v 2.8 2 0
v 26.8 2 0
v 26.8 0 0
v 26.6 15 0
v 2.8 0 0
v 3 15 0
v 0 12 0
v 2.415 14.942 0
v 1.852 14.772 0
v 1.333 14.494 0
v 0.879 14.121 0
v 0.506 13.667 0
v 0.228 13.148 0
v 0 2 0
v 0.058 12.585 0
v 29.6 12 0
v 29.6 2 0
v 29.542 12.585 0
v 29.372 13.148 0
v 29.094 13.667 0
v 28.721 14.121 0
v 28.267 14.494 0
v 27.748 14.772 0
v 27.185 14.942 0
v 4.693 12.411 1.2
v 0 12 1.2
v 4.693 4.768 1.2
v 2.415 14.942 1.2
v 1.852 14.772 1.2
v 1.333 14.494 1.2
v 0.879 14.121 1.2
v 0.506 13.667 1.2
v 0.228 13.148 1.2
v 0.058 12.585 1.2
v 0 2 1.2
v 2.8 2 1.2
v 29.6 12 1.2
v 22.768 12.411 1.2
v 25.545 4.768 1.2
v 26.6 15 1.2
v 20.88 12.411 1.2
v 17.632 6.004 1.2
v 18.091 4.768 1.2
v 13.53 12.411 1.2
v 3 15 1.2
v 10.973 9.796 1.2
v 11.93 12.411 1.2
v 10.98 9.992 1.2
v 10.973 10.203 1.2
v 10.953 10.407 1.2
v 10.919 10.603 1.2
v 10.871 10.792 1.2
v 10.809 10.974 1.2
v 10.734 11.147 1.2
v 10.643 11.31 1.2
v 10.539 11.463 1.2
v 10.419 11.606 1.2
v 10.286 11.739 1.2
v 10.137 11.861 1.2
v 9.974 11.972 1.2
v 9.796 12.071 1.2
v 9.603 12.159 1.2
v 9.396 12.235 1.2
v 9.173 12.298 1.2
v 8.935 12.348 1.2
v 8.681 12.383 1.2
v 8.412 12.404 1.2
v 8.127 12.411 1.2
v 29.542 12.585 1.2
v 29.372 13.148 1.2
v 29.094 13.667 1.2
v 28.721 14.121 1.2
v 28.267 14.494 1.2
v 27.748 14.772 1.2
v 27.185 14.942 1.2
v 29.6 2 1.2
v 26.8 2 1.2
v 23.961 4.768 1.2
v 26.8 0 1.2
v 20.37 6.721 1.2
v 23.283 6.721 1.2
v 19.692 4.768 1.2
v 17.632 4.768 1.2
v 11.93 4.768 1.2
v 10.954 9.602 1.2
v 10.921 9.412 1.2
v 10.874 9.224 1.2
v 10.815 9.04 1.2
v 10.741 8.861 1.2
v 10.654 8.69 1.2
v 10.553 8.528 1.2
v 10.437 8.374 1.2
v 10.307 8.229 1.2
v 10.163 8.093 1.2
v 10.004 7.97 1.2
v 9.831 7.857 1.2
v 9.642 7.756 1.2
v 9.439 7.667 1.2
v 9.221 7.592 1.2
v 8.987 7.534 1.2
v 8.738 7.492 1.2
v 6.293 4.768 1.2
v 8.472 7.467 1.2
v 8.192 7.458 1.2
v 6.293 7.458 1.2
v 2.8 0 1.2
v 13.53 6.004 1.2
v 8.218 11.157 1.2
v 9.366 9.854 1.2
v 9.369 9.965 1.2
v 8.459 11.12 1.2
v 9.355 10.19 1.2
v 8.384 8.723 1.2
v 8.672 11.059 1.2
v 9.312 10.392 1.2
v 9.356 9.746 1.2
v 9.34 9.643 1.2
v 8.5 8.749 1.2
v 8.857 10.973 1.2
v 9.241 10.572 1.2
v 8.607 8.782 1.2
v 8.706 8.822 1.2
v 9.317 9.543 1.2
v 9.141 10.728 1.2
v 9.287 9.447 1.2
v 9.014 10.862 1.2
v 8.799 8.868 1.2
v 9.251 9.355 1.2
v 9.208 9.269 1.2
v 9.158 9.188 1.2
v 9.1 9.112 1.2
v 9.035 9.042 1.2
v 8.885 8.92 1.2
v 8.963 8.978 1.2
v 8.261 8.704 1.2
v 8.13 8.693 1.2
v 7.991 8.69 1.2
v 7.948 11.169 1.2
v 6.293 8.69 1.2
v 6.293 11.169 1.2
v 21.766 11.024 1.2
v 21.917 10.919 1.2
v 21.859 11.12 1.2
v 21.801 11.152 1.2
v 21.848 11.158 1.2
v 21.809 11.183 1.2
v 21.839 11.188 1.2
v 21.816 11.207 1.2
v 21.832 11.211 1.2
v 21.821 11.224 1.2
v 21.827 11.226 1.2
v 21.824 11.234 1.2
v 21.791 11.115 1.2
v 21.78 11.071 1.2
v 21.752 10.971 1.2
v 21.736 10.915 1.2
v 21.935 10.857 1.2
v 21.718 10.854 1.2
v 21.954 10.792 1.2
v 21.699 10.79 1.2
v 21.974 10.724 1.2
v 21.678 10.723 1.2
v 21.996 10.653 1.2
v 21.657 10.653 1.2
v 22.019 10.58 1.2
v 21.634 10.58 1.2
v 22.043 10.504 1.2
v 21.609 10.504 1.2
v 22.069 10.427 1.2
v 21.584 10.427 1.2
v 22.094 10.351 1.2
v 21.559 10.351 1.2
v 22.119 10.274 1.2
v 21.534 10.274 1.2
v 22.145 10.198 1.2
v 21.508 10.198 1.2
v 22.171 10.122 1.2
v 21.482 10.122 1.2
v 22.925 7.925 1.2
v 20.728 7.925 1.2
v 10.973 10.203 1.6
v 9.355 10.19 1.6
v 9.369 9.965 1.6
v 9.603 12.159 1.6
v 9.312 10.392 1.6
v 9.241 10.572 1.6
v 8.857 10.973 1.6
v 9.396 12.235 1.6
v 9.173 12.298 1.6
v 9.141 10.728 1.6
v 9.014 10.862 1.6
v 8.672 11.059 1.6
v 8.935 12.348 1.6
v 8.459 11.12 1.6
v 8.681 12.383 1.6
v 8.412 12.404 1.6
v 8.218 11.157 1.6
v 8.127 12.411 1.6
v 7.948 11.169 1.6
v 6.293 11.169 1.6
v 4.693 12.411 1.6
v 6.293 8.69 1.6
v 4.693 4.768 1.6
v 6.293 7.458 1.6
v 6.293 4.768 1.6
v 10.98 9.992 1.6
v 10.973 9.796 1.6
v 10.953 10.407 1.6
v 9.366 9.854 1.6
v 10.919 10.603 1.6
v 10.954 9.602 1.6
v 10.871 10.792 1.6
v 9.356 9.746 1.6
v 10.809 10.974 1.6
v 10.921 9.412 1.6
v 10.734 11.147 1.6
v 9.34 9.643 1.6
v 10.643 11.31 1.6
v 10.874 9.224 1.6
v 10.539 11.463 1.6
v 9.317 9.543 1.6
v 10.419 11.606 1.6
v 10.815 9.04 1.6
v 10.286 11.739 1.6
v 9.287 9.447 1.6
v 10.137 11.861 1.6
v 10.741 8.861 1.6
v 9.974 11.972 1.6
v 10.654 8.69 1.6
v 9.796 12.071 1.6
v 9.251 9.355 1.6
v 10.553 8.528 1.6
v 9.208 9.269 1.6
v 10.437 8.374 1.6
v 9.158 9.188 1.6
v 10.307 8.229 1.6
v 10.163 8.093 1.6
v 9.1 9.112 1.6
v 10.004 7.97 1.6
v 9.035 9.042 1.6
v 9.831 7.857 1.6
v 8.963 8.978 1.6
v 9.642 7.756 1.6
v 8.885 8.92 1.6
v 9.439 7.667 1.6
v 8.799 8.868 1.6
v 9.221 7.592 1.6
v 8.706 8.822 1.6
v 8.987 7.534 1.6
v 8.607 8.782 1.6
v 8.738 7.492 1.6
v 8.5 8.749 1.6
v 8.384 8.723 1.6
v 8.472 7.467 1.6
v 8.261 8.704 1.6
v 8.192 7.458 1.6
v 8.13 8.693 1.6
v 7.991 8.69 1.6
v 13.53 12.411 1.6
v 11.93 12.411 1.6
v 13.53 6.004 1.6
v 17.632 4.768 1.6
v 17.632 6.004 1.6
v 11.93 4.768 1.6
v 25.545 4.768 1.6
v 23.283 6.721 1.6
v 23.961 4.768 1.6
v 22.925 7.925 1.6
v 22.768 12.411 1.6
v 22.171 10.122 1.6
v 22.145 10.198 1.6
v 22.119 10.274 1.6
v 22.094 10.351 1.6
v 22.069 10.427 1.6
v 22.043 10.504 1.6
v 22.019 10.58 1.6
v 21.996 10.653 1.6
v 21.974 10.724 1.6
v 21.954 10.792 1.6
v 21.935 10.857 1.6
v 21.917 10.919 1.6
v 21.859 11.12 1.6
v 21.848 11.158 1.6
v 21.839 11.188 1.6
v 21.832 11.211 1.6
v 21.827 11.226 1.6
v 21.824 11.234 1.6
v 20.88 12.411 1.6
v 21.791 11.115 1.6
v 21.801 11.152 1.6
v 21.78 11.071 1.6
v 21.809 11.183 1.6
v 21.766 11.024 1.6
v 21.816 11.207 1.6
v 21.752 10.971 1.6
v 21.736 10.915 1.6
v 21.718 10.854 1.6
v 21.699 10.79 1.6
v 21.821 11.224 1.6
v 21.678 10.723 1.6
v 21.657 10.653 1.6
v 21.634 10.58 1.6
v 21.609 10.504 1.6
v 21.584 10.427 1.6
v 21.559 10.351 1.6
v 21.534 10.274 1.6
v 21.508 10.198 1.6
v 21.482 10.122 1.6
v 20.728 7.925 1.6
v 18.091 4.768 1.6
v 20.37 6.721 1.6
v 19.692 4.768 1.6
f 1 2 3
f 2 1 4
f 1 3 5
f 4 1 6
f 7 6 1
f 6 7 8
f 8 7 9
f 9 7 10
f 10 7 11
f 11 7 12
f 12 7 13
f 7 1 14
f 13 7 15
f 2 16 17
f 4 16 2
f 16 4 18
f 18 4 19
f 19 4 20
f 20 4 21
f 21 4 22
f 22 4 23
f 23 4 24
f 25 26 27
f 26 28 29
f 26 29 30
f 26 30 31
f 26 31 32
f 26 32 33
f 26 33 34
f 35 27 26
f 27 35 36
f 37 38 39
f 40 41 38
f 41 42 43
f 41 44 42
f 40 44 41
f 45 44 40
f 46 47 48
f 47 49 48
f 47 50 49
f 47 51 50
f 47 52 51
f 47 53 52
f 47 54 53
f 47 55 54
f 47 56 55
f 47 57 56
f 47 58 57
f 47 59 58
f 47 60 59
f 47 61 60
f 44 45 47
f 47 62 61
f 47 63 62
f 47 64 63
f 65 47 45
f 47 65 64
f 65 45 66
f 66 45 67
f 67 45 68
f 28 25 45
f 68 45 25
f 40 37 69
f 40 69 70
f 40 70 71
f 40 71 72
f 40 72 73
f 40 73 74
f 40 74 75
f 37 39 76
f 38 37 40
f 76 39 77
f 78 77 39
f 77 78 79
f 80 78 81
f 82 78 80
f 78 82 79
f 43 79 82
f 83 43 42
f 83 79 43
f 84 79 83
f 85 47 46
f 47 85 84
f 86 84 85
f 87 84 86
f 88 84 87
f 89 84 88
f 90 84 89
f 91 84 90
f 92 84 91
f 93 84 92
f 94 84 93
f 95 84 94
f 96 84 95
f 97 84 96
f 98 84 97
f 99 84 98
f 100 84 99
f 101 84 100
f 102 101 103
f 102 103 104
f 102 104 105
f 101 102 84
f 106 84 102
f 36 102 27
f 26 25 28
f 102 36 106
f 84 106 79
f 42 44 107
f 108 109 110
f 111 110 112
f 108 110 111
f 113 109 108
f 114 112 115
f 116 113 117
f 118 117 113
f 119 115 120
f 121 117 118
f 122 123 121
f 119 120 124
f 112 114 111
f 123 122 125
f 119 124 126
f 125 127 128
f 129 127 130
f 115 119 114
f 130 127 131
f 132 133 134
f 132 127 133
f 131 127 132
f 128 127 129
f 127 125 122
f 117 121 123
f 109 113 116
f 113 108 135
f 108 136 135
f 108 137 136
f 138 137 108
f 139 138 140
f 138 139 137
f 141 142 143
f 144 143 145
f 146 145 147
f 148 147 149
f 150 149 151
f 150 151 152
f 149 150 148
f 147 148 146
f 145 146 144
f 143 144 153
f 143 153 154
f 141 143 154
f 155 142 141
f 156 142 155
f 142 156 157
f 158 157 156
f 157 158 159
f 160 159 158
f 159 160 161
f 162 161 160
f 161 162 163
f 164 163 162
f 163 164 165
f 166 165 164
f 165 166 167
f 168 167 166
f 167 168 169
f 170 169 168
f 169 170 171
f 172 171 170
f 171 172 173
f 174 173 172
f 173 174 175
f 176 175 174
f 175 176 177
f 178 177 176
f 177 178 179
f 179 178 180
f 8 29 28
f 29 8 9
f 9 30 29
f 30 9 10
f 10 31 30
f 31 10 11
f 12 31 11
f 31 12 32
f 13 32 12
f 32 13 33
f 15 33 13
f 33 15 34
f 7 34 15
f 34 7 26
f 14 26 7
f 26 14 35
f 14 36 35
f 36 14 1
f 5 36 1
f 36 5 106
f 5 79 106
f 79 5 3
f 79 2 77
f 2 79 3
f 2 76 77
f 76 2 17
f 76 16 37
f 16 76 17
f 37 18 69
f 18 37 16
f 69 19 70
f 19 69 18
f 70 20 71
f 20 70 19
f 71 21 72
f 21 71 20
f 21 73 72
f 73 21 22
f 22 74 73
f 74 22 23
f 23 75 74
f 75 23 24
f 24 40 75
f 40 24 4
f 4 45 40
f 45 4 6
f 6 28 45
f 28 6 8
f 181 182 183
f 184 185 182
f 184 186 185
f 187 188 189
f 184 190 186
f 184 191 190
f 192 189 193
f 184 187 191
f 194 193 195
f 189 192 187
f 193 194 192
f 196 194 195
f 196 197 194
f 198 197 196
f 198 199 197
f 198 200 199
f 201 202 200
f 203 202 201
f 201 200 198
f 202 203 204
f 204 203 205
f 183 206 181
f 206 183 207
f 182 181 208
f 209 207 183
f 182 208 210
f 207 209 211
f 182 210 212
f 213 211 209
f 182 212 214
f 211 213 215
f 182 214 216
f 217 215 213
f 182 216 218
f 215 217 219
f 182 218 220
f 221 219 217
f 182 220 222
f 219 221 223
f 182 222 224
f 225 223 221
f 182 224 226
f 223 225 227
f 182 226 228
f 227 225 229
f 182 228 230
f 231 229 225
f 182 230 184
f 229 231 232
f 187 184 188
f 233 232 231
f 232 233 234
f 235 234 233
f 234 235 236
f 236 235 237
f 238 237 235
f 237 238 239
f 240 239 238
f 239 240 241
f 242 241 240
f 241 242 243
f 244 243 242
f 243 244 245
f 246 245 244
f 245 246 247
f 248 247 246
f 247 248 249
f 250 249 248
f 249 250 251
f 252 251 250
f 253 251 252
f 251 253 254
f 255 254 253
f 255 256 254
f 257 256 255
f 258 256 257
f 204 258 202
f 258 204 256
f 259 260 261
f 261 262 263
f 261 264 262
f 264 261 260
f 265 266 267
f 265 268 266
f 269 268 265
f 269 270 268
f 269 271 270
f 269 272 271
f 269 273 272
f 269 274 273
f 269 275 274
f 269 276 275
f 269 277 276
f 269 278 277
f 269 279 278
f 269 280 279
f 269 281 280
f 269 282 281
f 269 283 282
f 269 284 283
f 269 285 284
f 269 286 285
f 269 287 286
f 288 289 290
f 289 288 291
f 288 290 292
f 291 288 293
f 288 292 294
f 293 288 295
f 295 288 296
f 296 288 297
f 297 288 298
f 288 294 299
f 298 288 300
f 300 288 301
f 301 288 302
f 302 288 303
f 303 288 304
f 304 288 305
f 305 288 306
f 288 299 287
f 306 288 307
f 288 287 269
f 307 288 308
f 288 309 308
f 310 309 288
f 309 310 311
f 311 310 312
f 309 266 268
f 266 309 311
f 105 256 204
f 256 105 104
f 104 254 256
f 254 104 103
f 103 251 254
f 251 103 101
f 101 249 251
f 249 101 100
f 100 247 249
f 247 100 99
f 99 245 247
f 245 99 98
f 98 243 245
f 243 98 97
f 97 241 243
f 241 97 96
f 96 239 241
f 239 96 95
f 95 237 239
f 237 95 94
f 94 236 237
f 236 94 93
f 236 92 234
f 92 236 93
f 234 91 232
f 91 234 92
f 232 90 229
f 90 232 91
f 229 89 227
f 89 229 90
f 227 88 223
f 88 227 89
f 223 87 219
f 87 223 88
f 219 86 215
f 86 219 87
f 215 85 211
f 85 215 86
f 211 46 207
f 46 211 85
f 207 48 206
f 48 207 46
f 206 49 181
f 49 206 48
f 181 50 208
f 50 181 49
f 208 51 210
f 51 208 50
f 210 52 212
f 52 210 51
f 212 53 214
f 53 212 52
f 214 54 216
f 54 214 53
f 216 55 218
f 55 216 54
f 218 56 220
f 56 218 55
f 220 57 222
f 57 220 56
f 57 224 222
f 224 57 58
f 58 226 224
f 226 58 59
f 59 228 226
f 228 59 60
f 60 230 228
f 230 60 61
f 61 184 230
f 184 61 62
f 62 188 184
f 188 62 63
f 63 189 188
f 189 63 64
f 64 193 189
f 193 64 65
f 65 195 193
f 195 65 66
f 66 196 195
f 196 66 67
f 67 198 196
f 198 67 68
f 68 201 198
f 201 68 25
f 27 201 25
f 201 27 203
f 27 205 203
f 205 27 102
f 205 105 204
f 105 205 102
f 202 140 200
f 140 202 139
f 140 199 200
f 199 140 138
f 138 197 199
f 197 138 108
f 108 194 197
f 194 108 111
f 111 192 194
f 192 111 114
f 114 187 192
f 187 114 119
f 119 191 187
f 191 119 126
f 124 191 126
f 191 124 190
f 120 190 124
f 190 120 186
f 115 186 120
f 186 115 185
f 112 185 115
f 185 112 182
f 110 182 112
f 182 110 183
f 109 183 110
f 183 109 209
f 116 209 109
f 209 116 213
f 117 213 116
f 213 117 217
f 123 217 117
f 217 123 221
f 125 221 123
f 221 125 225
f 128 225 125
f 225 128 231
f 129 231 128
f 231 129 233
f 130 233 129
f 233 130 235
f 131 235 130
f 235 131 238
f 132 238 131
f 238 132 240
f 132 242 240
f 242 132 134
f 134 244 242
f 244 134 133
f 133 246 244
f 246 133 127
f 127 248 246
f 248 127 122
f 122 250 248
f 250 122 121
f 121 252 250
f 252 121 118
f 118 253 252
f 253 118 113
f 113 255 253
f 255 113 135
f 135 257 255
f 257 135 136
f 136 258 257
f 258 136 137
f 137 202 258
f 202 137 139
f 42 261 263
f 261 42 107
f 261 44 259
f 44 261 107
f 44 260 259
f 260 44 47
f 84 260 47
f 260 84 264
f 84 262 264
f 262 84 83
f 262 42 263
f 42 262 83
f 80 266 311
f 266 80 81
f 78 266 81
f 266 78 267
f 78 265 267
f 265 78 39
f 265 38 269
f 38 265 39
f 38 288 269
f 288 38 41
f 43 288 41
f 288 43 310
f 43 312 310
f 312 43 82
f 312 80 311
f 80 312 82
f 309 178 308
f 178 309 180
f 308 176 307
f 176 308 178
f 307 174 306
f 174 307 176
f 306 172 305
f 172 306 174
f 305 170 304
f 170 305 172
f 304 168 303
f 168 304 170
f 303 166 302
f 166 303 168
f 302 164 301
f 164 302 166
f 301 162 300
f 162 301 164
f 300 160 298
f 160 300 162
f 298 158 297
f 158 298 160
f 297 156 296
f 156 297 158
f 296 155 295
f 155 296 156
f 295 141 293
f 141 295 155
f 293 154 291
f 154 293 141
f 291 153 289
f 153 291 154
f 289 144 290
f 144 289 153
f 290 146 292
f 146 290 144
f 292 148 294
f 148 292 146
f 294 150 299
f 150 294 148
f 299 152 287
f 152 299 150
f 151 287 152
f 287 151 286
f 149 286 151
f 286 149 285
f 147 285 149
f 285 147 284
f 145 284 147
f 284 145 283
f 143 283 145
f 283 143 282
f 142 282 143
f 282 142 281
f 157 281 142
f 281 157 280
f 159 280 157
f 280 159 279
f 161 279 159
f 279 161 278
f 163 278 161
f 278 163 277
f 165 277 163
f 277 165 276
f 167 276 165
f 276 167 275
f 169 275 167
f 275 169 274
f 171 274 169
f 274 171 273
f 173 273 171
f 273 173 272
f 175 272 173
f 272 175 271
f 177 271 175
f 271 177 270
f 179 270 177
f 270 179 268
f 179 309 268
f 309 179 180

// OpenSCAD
/* [show] */
showStand=true;
showLabel=true;
showCut=true;
showSwatch=true;
variant="normal"; //["normal","narrow"]
/* [Dimensions] */
ovDims= variant=="narrow" ? [72,150,35] : [74,150,35];
lblDims=[29.6,1.2,15];
lblSpcng=0.1;
lblLidLen=2;
lblLidWdth=24;

lblVertPos=[ovDims.x/2,0.8,1.0];

/* [label] */
Text="PLA";
Text_Style="Emboss"; //["Emboss", "Engrave", "Inset"]
Text_Size=8;
Text_Depth=0.4;
Text_Color="#000000"; //color
Back_Color="#00EEFF"; //color
Font_Face="Liberation Sans"; // ["Aldo", "Anton", "Archivo Black", "Asap", "Bangers", "Black Han Sans", "Bubblegum Sans", "Bungee", "Changa One", "Chewy", "Concert One", "Fruktur", "Gochi Hand", "Griffy", "HarmonyOS Sans SC", "Inter", "Inter Tight", "Itim", "Jockey One", "Kanit", "Kavoon", "Komikazoom", "Lato", "Liberation Sans", "Lilita One", "Lobster", "Lora", "Luckiest Guy", "Merriweather", "Merriweather Sans", "Mitr", "Montserrat", "Montserrat Alternates", "Montserrat Subrayada", "Nanum Pen", "Norwester", "Noto Emoji", "Noto Sans", "Noto Sans Adlam", "Noto Sans Adlam Unjoined", "Noto Sans Anatolian Hieroglyphs", "Noto Sans Arabic", "Noto Sans Arabic UI", "Noto Sans Armenian", "Noto Sans Avestan", "Noto Sans Balinese", "Noto Sans Bamum", "Noto Sans Bassa Vah", "Noto Sans Batak", "Noto Sans Bengali", "Noto Sans Bengali UI", "Noto Sans Bhaiksuki", "Noto Sans Brahmi", "Noto Sans Buginese", "Noto Sans Buhid", "Noto Sans Canadian Aboriginal", "Noto Sans Carian", "Noto Sans Caucasian Albanian", "Noto Sans Chakma", "Noto Sans Cham", "Noto Sans Cherokee", "Noto Sans Chorasmian", "Noto Sans Coptic", "Noto Sans Cuneiform", "Noto Sans Cypriot", "Noto Sans Cypro Minoan", "Noto Sans Deseret", "Noto Sans Devanagari", "Noto Sans Devanagari UI", "Noto Sans Display", "Noto Sans Duployan", "Noto Sans Egyptian Hieroglyphs", "Noto Sans Elbasan", "Noto Sans Elymaic", "Noto Sans Ethiopic", "Noto Sans Georgian", "Noto Sans Glagolitic", "Noto Sans Gothic", "Noto Sans Grantha", "Noto Sans Gujarati", "Noto Sans Gujarati UI", "Noto Sans Gunjala Gondi", "Noto Sans Gurmukhi", "Noto Sans Gurmukhi UI", "Noto Sans HK", "Noto Sans Hanifi Rohingya", "Noto Sans Hanunoo", "Noto Sans Hatran", "Noto Sans Hebrew", "Noto Sans Imperial Aramaic", "Noto Sans Indic Siyaq Numbers", "Noto Sans Inscriptional Pahlavi", "Noto Sans Inscriptional Parthian", "Noto Sans JP", "Noto Sans Javanese", "Noto Sans KR", "Noto Sans Kaithi", "Noto Sans Kannada", "Noto Sans Kannada UI", "Noto Sans Kawi", "Noto Sans Kayah Li", "Noto Sans Kharoshthi", "Noto Sans Khmer", "Noto Sans Khmer UI", "Noto Sans Khojki", "Noto Sans Khudawadi", "Noto Sans Lao", "Noto Sans Lao Looped", "Noto Sans Lao UI", "Noto Sans Lepcha", "Noto Sans Limbu", "Noto Sans Linear A", "Noto Sans Linear B", "Noto Sans Lisu", "Noto Sans Lycian", "Noto Sans Lydian", "Noto Sans Mahajani", "Noto Sans Malayalam", "Noto Sans Malayalam UI", "Noto Sans Mandaic", "Noto Sans Manichaean", "Noto Sans Marchen", "Noto Sans Masaram Gondi", "Noto Sans Math", "Noto Sans Mayan Numerals", "Noto Sans Medefaidrin", "Noto Sans Meetei Mayek", "Noto Sans Mende Kikakui", "Noto Sans Meroitic", "Noto Sans Miao", "Noto Sans Modi", "Noto Sans Mongolian", "Noto Sans Mono", "Noto Sans Mro", "Noto Sans Multani", "Noto Sans Myanmar", "Noto Sans Myanmar UI", "Noto Sans NKo", "Noto Sans NKo Unjoined", "Noto Sans Nabataean", "Noto Sans Nag Mundari", "Noto Sans Nandinagari", "Noto Sans New Tai Lue", "Noto Sans Newa", "Noto Sans Nushu", "Noto Sans Ogham", "Noto Sans Ol Chiki", "Noto Sans Old Hungarian", "Noto Sans Old Italic", "Noto Sans Old North Arabian", "Noto Sans Old Permic", "Noto Sans Old Persian", "Noto Sans Old Sogdian", "Noto Sans Old South Arabian", "Noto Sans Old Turkic", "Noto Sans Oriya", "Noto Sans Oriya UI", "Noto Sans Osage", "Noto Sans Osmanya", "Noto Sans Pahawh Hmong", "Noto Sans Palmyrene", "Noto Sans Pau Cin Hau", "Noto Sans PhagsPa", "Noto Sans Phoenician", "Noto Sans Psalter Pahlavi", "Noto Sans Rejang", "Noto Sans Runic", "Noto Sans SC", "Noto Sans Samaritan", "Noto Sans Saurashtra", "Noto Sans Sharada", "Noto Sans Shavian", "Noto Sans Siddham", "Noto Sans SignWriting", "Noto Sans Sinhala", "Noto Sans Sinhala UI", "Noto Sans Sogdian", "Noto Sans Sora Sompeng", "Noto Sans Soyombo", "Noto Sans Sundanese", "Noto Sans Syloti Nagri", "Noto Sans Symbols", "Noto Sans Symbols 2", "Noto Sans Syriac", "Noto Sans Syriac Eastern", "Noto Sans TC", "Noto Sans Tagalog", "Noto Sans Tagbanwa", "Noto Sans Tai Le", "Noto Sans Tai Tham", "Noto Sans Tai Viet", "Noto Sans Takri", "Noto Sans Tamil", "Noto Sans Tamil Supplement", "Noto Sans Tamil UI", "Noto Sans Tangsa", "Noto Sans Telugu", "Noto Sans Telugu UI", "Noto Sans Thaana", "Noto Sans Thai", "Noto Sans Thai Looped", "Noto Sans Thai UI", "Noto Sans Tifinagh", "Noto Sans Tirhuta", "Noto Sans Ugaritic", "Noto Sans Vai", "Noto Sans Vithkuqi", "Noto Sans Wancho", "Noto Sans Warang Citi", "Noto Sans Yi", "Noto Sans Zanabazar Square", "Nunito", "Nunito Sans", "Open Sans", "Open Sans Condensed", "Open Sans Hebrew", "Open Sans Hebrew Condensed", "Orbitron", "Oswald", "Palanquin Dark", "Passion One", "Patrick Hand", "Paytone One", "Permanent Marker", "Playfair Display", "Playfair Display SC", "Plus Jakarta Sans", "PoetsenOne", "Poppins", "Rakkas", "Raleway", "Raleway Dots", "Roboto", "Roboto Condensed", "Roboto Flex", "Roboto Mono", "Roboto Serif", "Roboto Slab", "Rubik", "Rubik 80s Fade", "Rubik Beastly", "Rubik Broken Fax", "Rubik Bubbles", "Rubik Burned", "Rubik Dirt", "Rubik Distressed", "Rubik Doodle Shadow", "Rubik Doodle Triangles", "Rubik Gemstones", "Rubik Glitch", "Rubik Glitch Pop", "Rubik Iso", "Rubik Lines", "Rubik Maps", "Rubik Marker Hatch", "Rubik Maze", "Rubik Microbe", "Rubik Mono One", "Rubik Moonrocks", "Rubik One", "Rubik Pixels", "Rubik Puddles", "Rubik Scribble", "Rubik Spray Paint", "Rubik Storm", "Rubik Vinyl", "Rubik Wet Paint", "Russo One", "Saira Stencil One", "Shrikhand", "Source Sans 3", "Spicy Rice", "Squada One", "Titan One", "Ubuntu", "Ubuntu Condensed", "Ubuntu Mono", "Ubuntu Sans", "Ubuntu Sans Mono", "Work Sans"]
Font_Style="Bold"; //["Light", "Regular", "Medium", "Bold", "ExtraBold"]

/* [Hidden] */
fudge=0.1;


if (showStand)
  difference(){
    stand();
    if (showCut) color("darkred") translate([ovDims.x,ovDims.y/2,ovDims.z/2]) cube(ovDims+[0.1,0.1,0.1],true);
    }
    
if (showLabel)
  color("grey") translate(lblVertPos+[-lblDims.x/2,0,0]) rotate([90,-90,180]) import("LabelToBeCustomized.stl");
  
module stand(){
  difference(){
    union(){
      if (variant=="narrow")
        import("SpoolStandNarrow.stl",convexity=4);
      else
        import("SpoolStand.stl",convexity=4);
      //close the angled slot
      *translate([ovDims.x/2,3.94,3.00]) cube([29,3.2,4],true);
    }
    
    //add an angled slot (but more to the back)
    *translate([ovDims.x/2,5.05,3.89]) rotate([-25,0,0]) cube([28,1.2,5],true);
    //cut out for front label
    translate([lblVertPos.x,(lblDims.y+lblVertPos.y)/2,5-(5-lblVertPos.z-2-fudge)/2]) 
      cube([lblDims.x+lblSpcng,lblDims.y+lblVertPos.y+lblSpcng*2,5-lblVertPos.z-2+fudge],true);
    translate(lblVertPos+[0,lblDims.y/2,1]) cube([24+lblSpcng*2,lblDims.y+lblSpcng*2,2+lblSpcng*2],true);
  }
}

!label();
module label(){
  rad=3;

  $fn=32;
  difference(){
    color(Back_Color) linear_extrude(lblDims.y){
      translate([0,lblLidLen]) square([lblDims.x,lblDims.z-lblLidLen-rad]);
      translate([rad,lblDims.z-rad]) square([lblDims.x-rad*2,rad]);
      for (ix=[0,1])
        translate([rad+ix*(lblDims.x-rad*2),lblDims.z-rad]) circle(r=rad);
      translate([(lblDims.x-lblLidWdth)/2,0]) square([lblLidWdth,lblLidLen]);
      
    }
  if (Text_Style=="Engrave") color(Text_Color) 
    translate([0,0,lblDims.y-Text_Depth]) linear_extrude(Text_Depth+fudge,convexity=3) txtLine();
  if (Text_Style=="Inset") color(Back_Color)
    translate([0,0,lblDims.y-Text_Depth*2]) linear_extrude(Text_Depth*2+fudge,convexity=3) txtLine();
  }
  if (Text_Style=="Emboss") color(Text_Color) 
    translate([0,0,lblDims.y]) linear_extrude(Text_Depth) txtLine();
  if (Text_Style=="Inset") color(Text_Color)
    translate([0,0,lblDims.y-Text_Depth*2]) linear_extrude(Text_Depth,convexity=3) txtLine();
  
}


module txtLine() {
    translate([lblDims.x/2,(lblDims.z+lblLidLen)/2,0]) 
        text(
            text = Text,
            font = str(Font_Face, ":style=", Font_Style),
            size = Text_Size,
            valign = "center",
            halign = "center"
        );
}
